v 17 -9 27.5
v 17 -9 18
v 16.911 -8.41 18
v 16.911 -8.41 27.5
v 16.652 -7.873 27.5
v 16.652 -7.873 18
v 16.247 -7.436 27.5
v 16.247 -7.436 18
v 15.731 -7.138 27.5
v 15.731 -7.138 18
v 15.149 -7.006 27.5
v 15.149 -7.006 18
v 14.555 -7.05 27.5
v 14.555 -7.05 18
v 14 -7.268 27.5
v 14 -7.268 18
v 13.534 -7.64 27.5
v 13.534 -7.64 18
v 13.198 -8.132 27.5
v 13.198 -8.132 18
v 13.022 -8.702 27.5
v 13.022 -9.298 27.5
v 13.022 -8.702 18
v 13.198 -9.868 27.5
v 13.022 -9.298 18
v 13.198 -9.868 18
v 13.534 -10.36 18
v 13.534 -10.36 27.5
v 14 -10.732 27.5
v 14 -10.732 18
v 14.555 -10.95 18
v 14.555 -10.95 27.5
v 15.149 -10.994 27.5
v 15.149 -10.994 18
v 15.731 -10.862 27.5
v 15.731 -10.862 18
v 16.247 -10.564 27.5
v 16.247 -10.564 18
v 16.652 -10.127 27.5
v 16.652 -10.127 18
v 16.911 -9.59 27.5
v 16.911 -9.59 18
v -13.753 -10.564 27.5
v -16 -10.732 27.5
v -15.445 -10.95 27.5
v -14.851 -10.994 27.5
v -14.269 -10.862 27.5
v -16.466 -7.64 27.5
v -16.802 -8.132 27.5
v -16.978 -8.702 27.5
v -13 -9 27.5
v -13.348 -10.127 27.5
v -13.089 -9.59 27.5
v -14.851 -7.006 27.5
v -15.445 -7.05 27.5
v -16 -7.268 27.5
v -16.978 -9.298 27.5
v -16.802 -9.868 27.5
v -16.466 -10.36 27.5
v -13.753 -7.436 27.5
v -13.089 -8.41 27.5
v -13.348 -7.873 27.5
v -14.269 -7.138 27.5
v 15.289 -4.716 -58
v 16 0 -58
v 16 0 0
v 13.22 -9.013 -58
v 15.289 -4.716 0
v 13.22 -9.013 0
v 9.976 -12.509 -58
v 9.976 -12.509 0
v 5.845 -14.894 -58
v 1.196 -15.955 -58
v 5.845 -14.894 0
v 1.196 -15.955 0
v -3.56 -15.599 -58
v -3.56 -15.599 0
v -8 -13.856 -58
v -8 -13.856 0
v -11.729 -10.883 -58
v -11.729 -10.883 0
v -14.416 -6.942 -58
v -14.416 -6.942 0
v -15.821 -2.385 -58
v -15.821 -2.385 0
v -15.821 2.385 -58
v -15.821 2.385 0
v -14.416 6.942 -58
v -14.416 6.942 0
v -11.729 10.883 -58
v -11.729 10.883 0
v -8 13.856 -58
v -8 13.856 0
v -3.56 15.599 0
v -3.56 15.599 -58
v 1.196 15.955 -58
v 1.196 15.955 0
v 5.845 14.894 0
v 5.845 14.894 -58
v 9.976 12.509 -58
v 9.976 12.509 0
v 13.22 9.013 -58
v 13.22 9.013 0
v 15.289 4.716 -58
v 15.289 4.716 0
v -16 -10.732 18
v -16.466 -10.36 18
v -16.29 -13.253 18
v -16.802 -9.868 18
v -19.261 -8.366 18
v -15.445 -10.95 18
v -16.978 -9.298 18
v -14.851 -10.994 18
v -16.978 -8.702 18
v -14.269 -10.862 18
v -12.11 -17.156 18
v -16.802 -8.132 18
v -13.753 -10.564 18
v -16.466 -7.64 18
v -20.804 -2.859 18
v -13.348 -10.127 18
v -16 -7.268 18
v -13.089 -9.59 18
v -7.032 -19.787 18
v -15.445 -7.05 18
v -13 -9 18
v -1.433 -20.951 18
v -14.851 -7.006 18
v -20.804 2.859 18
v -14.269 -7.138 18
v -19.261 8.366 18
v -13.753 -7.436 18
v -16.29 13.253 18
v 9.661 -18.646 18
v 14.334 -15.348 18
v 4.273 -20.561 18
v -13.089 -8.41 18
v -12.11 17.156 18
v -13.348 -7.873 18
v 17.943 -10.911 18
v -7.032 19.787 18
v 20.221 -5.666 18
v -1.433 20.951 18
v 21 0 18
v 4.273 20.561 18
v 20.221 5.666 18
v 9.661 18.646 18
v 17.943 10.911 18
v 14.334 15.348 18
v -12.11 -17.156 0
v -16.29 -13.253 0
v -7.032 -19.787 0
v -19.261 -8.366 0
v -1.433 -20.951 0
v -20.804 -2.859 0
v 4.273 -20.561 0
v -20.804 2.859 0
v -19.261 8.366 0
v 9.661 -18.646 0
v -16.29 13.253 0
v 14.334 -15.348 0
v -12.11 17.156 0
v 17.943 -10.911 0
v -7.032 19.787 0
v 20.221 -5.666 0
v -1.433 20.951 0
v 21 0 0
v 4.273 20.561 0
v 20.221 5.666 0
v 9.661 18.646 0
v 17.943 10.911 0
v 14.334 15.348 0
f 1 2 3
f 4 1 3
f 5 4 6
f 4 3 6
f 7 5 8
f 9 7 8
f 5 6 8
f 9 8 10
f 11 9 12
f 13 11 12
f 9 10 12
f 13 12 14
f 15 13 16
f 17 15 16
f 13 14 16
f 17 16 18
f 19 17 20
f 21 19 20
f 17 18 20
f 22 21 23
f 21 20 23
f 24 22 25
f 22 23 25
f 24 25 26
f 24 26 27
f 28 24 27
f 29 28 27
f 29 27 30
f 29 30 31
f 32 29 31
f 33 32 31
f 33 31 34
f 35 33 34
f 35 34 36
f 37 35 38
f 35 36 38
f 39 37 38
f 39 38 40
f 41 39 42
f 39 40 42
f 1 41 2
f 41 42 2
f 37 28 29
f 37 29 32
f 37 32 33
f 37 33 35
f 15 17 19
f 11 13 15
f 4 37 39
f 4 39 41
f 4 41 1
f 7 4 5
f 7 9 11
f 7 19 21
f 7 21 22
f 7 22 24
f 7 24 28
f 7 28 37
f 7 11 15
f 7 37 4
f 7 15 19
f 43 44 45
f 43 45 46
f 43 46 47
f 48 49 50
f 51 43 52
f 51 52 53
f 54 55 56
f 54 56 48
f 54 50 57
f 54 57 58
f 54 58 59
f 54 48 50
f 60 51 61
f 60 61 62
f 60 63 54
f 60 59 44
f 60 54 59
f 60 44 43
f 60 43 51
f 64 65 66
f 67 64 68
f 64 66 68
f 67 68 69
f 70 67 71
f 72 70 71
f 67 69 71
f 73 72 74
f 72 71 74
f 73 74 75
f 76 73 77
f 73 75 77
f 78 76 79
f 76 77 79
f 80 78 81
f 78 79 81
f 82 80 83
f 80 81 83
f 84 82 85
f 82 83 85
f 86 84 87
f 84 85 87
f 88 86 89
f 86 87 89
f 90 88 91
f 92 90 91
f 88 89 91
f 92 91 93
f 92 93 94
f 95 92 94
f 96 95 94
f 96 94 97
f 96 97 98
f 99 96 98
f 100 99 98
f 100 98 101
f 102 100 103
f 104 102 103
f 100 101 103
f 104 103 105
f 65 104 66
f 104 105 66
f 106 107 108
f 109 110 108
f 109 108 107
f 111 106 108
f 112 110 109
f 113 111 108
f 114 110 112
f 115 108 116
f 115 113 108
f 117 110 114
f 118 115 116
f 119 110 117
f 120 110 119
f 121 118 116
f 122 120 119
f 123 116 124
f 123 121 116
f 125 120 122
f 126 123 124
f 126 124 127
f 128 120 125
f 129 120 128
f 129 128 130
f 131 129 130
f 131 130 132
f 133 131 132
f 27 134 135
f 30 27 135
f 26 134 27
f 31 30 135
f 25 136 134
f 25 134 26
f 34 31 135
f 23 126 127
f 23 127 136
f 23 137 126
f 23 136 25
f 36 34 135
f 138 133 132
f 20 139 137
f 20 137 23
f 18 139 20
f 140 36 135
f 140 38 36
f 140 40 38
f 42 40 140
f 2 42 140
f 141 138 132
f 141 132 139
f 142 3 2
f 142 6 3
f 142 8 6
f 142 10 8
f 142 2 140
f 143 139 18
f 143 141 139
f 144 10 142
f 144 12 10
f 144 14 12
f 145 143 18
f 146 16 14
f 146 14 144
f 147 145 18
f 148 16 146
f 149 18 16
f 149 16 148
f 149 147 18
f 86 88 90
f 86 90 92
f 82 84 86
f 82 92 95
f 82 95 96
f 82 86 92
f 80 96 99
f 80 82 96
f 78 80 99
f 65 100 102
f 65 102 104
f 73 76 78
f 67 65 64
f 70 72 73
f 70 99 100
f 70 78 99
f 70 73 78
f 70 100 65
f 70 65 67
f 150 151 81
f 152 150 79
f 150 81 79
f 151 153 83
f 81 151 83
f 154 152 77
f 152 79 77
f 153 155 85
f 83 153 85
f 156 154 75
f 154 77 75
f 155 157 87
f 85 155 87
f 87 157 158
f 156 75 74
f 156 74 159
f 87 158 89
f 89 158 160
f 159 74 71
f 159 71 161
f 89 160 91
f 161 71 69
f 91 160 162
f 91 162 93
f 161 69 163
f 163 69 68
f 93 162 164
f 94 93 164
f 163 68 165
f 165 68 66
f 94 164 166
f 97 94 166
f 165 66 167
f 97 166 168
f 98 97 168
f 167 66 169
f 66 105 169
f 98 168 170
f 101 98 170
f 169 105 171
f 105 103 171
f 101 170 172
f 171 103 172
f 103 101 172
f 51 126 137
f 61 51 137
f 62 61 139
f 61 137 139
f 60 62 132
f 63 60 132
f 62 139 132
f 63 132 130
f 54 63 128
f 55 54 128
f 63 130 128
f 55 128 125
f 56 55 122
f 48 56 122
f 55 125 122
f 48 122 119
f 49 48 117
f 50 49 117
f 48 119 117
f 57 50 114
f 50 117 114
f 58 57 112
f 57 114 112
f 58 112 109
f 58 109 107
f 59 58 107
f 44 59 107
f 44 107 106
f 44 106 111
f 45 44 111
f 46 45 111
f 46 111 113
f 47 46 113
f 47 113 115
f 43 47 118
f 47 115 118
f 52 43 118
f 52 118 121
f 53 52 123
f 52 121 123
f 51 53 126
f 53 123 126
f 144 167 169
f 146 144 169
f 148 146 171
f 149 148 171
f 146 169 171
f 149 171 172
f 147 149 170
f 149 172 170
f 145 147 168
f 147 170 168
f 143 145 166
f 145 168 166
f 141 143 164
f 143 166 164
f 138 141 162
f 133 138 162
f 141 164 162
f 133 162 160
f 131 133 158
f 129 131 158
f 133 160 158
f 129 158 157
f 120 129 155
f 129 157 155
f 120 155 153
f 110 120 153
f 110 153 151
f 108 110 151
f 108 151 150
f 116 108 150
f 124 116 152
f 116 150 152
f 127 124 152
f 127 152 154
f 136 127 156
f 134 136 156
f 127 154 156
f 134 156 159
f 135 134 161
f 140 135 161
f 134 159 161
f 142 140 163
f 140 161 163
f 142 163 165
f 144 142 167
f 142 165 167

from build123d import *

# Parameters (mm, degrees)
ESQUISSE1_R        = 21
BOSS_EXTRU_1_DEPTH = 18
ESQUISSE2_R        = 16
BOSS_EXTRU_2_DEPTH = 58
ESQUISSE7_R        = 2
BOSS_EXTRU_3_DEPTH = 9.5


with BuildPart() as part:
    # Esquisse1 → Boss.-Extru.1 (new body)
    with BuildSketch(Plane.XY):
        Circle(ESQUISSE1_R)
    extrude(amount=BOSS_EXTRU_1_DEPTH)

    # Esquisse2 → Boss.-Extru.2 (add)
    with BuildSketch(Plane(origin=(0, 0, 0), x_dir=(-1, 0, 0), z_dir=(0, 0, -1))):
        with Locations(Location((0, 0, 0), (0, 0, 180))):
            Circle(ESQUISSE2_R)
    extrude(amount=BOSS_EXTRU_2_DEPTH)

    # Esquisse7 → Boss.-Extru.3 (add)
    with BuildSketch(Plane.XY.offset(18)):
        with Locations((-15, -9)):
            Circle(ESQUISSE7_R)
        with Locations((15, -9)):
            Circle(ESQUISSE7_R)
    extrude(amount=BOSS_EXTRU_3_DEPTH)


solid = part.part
